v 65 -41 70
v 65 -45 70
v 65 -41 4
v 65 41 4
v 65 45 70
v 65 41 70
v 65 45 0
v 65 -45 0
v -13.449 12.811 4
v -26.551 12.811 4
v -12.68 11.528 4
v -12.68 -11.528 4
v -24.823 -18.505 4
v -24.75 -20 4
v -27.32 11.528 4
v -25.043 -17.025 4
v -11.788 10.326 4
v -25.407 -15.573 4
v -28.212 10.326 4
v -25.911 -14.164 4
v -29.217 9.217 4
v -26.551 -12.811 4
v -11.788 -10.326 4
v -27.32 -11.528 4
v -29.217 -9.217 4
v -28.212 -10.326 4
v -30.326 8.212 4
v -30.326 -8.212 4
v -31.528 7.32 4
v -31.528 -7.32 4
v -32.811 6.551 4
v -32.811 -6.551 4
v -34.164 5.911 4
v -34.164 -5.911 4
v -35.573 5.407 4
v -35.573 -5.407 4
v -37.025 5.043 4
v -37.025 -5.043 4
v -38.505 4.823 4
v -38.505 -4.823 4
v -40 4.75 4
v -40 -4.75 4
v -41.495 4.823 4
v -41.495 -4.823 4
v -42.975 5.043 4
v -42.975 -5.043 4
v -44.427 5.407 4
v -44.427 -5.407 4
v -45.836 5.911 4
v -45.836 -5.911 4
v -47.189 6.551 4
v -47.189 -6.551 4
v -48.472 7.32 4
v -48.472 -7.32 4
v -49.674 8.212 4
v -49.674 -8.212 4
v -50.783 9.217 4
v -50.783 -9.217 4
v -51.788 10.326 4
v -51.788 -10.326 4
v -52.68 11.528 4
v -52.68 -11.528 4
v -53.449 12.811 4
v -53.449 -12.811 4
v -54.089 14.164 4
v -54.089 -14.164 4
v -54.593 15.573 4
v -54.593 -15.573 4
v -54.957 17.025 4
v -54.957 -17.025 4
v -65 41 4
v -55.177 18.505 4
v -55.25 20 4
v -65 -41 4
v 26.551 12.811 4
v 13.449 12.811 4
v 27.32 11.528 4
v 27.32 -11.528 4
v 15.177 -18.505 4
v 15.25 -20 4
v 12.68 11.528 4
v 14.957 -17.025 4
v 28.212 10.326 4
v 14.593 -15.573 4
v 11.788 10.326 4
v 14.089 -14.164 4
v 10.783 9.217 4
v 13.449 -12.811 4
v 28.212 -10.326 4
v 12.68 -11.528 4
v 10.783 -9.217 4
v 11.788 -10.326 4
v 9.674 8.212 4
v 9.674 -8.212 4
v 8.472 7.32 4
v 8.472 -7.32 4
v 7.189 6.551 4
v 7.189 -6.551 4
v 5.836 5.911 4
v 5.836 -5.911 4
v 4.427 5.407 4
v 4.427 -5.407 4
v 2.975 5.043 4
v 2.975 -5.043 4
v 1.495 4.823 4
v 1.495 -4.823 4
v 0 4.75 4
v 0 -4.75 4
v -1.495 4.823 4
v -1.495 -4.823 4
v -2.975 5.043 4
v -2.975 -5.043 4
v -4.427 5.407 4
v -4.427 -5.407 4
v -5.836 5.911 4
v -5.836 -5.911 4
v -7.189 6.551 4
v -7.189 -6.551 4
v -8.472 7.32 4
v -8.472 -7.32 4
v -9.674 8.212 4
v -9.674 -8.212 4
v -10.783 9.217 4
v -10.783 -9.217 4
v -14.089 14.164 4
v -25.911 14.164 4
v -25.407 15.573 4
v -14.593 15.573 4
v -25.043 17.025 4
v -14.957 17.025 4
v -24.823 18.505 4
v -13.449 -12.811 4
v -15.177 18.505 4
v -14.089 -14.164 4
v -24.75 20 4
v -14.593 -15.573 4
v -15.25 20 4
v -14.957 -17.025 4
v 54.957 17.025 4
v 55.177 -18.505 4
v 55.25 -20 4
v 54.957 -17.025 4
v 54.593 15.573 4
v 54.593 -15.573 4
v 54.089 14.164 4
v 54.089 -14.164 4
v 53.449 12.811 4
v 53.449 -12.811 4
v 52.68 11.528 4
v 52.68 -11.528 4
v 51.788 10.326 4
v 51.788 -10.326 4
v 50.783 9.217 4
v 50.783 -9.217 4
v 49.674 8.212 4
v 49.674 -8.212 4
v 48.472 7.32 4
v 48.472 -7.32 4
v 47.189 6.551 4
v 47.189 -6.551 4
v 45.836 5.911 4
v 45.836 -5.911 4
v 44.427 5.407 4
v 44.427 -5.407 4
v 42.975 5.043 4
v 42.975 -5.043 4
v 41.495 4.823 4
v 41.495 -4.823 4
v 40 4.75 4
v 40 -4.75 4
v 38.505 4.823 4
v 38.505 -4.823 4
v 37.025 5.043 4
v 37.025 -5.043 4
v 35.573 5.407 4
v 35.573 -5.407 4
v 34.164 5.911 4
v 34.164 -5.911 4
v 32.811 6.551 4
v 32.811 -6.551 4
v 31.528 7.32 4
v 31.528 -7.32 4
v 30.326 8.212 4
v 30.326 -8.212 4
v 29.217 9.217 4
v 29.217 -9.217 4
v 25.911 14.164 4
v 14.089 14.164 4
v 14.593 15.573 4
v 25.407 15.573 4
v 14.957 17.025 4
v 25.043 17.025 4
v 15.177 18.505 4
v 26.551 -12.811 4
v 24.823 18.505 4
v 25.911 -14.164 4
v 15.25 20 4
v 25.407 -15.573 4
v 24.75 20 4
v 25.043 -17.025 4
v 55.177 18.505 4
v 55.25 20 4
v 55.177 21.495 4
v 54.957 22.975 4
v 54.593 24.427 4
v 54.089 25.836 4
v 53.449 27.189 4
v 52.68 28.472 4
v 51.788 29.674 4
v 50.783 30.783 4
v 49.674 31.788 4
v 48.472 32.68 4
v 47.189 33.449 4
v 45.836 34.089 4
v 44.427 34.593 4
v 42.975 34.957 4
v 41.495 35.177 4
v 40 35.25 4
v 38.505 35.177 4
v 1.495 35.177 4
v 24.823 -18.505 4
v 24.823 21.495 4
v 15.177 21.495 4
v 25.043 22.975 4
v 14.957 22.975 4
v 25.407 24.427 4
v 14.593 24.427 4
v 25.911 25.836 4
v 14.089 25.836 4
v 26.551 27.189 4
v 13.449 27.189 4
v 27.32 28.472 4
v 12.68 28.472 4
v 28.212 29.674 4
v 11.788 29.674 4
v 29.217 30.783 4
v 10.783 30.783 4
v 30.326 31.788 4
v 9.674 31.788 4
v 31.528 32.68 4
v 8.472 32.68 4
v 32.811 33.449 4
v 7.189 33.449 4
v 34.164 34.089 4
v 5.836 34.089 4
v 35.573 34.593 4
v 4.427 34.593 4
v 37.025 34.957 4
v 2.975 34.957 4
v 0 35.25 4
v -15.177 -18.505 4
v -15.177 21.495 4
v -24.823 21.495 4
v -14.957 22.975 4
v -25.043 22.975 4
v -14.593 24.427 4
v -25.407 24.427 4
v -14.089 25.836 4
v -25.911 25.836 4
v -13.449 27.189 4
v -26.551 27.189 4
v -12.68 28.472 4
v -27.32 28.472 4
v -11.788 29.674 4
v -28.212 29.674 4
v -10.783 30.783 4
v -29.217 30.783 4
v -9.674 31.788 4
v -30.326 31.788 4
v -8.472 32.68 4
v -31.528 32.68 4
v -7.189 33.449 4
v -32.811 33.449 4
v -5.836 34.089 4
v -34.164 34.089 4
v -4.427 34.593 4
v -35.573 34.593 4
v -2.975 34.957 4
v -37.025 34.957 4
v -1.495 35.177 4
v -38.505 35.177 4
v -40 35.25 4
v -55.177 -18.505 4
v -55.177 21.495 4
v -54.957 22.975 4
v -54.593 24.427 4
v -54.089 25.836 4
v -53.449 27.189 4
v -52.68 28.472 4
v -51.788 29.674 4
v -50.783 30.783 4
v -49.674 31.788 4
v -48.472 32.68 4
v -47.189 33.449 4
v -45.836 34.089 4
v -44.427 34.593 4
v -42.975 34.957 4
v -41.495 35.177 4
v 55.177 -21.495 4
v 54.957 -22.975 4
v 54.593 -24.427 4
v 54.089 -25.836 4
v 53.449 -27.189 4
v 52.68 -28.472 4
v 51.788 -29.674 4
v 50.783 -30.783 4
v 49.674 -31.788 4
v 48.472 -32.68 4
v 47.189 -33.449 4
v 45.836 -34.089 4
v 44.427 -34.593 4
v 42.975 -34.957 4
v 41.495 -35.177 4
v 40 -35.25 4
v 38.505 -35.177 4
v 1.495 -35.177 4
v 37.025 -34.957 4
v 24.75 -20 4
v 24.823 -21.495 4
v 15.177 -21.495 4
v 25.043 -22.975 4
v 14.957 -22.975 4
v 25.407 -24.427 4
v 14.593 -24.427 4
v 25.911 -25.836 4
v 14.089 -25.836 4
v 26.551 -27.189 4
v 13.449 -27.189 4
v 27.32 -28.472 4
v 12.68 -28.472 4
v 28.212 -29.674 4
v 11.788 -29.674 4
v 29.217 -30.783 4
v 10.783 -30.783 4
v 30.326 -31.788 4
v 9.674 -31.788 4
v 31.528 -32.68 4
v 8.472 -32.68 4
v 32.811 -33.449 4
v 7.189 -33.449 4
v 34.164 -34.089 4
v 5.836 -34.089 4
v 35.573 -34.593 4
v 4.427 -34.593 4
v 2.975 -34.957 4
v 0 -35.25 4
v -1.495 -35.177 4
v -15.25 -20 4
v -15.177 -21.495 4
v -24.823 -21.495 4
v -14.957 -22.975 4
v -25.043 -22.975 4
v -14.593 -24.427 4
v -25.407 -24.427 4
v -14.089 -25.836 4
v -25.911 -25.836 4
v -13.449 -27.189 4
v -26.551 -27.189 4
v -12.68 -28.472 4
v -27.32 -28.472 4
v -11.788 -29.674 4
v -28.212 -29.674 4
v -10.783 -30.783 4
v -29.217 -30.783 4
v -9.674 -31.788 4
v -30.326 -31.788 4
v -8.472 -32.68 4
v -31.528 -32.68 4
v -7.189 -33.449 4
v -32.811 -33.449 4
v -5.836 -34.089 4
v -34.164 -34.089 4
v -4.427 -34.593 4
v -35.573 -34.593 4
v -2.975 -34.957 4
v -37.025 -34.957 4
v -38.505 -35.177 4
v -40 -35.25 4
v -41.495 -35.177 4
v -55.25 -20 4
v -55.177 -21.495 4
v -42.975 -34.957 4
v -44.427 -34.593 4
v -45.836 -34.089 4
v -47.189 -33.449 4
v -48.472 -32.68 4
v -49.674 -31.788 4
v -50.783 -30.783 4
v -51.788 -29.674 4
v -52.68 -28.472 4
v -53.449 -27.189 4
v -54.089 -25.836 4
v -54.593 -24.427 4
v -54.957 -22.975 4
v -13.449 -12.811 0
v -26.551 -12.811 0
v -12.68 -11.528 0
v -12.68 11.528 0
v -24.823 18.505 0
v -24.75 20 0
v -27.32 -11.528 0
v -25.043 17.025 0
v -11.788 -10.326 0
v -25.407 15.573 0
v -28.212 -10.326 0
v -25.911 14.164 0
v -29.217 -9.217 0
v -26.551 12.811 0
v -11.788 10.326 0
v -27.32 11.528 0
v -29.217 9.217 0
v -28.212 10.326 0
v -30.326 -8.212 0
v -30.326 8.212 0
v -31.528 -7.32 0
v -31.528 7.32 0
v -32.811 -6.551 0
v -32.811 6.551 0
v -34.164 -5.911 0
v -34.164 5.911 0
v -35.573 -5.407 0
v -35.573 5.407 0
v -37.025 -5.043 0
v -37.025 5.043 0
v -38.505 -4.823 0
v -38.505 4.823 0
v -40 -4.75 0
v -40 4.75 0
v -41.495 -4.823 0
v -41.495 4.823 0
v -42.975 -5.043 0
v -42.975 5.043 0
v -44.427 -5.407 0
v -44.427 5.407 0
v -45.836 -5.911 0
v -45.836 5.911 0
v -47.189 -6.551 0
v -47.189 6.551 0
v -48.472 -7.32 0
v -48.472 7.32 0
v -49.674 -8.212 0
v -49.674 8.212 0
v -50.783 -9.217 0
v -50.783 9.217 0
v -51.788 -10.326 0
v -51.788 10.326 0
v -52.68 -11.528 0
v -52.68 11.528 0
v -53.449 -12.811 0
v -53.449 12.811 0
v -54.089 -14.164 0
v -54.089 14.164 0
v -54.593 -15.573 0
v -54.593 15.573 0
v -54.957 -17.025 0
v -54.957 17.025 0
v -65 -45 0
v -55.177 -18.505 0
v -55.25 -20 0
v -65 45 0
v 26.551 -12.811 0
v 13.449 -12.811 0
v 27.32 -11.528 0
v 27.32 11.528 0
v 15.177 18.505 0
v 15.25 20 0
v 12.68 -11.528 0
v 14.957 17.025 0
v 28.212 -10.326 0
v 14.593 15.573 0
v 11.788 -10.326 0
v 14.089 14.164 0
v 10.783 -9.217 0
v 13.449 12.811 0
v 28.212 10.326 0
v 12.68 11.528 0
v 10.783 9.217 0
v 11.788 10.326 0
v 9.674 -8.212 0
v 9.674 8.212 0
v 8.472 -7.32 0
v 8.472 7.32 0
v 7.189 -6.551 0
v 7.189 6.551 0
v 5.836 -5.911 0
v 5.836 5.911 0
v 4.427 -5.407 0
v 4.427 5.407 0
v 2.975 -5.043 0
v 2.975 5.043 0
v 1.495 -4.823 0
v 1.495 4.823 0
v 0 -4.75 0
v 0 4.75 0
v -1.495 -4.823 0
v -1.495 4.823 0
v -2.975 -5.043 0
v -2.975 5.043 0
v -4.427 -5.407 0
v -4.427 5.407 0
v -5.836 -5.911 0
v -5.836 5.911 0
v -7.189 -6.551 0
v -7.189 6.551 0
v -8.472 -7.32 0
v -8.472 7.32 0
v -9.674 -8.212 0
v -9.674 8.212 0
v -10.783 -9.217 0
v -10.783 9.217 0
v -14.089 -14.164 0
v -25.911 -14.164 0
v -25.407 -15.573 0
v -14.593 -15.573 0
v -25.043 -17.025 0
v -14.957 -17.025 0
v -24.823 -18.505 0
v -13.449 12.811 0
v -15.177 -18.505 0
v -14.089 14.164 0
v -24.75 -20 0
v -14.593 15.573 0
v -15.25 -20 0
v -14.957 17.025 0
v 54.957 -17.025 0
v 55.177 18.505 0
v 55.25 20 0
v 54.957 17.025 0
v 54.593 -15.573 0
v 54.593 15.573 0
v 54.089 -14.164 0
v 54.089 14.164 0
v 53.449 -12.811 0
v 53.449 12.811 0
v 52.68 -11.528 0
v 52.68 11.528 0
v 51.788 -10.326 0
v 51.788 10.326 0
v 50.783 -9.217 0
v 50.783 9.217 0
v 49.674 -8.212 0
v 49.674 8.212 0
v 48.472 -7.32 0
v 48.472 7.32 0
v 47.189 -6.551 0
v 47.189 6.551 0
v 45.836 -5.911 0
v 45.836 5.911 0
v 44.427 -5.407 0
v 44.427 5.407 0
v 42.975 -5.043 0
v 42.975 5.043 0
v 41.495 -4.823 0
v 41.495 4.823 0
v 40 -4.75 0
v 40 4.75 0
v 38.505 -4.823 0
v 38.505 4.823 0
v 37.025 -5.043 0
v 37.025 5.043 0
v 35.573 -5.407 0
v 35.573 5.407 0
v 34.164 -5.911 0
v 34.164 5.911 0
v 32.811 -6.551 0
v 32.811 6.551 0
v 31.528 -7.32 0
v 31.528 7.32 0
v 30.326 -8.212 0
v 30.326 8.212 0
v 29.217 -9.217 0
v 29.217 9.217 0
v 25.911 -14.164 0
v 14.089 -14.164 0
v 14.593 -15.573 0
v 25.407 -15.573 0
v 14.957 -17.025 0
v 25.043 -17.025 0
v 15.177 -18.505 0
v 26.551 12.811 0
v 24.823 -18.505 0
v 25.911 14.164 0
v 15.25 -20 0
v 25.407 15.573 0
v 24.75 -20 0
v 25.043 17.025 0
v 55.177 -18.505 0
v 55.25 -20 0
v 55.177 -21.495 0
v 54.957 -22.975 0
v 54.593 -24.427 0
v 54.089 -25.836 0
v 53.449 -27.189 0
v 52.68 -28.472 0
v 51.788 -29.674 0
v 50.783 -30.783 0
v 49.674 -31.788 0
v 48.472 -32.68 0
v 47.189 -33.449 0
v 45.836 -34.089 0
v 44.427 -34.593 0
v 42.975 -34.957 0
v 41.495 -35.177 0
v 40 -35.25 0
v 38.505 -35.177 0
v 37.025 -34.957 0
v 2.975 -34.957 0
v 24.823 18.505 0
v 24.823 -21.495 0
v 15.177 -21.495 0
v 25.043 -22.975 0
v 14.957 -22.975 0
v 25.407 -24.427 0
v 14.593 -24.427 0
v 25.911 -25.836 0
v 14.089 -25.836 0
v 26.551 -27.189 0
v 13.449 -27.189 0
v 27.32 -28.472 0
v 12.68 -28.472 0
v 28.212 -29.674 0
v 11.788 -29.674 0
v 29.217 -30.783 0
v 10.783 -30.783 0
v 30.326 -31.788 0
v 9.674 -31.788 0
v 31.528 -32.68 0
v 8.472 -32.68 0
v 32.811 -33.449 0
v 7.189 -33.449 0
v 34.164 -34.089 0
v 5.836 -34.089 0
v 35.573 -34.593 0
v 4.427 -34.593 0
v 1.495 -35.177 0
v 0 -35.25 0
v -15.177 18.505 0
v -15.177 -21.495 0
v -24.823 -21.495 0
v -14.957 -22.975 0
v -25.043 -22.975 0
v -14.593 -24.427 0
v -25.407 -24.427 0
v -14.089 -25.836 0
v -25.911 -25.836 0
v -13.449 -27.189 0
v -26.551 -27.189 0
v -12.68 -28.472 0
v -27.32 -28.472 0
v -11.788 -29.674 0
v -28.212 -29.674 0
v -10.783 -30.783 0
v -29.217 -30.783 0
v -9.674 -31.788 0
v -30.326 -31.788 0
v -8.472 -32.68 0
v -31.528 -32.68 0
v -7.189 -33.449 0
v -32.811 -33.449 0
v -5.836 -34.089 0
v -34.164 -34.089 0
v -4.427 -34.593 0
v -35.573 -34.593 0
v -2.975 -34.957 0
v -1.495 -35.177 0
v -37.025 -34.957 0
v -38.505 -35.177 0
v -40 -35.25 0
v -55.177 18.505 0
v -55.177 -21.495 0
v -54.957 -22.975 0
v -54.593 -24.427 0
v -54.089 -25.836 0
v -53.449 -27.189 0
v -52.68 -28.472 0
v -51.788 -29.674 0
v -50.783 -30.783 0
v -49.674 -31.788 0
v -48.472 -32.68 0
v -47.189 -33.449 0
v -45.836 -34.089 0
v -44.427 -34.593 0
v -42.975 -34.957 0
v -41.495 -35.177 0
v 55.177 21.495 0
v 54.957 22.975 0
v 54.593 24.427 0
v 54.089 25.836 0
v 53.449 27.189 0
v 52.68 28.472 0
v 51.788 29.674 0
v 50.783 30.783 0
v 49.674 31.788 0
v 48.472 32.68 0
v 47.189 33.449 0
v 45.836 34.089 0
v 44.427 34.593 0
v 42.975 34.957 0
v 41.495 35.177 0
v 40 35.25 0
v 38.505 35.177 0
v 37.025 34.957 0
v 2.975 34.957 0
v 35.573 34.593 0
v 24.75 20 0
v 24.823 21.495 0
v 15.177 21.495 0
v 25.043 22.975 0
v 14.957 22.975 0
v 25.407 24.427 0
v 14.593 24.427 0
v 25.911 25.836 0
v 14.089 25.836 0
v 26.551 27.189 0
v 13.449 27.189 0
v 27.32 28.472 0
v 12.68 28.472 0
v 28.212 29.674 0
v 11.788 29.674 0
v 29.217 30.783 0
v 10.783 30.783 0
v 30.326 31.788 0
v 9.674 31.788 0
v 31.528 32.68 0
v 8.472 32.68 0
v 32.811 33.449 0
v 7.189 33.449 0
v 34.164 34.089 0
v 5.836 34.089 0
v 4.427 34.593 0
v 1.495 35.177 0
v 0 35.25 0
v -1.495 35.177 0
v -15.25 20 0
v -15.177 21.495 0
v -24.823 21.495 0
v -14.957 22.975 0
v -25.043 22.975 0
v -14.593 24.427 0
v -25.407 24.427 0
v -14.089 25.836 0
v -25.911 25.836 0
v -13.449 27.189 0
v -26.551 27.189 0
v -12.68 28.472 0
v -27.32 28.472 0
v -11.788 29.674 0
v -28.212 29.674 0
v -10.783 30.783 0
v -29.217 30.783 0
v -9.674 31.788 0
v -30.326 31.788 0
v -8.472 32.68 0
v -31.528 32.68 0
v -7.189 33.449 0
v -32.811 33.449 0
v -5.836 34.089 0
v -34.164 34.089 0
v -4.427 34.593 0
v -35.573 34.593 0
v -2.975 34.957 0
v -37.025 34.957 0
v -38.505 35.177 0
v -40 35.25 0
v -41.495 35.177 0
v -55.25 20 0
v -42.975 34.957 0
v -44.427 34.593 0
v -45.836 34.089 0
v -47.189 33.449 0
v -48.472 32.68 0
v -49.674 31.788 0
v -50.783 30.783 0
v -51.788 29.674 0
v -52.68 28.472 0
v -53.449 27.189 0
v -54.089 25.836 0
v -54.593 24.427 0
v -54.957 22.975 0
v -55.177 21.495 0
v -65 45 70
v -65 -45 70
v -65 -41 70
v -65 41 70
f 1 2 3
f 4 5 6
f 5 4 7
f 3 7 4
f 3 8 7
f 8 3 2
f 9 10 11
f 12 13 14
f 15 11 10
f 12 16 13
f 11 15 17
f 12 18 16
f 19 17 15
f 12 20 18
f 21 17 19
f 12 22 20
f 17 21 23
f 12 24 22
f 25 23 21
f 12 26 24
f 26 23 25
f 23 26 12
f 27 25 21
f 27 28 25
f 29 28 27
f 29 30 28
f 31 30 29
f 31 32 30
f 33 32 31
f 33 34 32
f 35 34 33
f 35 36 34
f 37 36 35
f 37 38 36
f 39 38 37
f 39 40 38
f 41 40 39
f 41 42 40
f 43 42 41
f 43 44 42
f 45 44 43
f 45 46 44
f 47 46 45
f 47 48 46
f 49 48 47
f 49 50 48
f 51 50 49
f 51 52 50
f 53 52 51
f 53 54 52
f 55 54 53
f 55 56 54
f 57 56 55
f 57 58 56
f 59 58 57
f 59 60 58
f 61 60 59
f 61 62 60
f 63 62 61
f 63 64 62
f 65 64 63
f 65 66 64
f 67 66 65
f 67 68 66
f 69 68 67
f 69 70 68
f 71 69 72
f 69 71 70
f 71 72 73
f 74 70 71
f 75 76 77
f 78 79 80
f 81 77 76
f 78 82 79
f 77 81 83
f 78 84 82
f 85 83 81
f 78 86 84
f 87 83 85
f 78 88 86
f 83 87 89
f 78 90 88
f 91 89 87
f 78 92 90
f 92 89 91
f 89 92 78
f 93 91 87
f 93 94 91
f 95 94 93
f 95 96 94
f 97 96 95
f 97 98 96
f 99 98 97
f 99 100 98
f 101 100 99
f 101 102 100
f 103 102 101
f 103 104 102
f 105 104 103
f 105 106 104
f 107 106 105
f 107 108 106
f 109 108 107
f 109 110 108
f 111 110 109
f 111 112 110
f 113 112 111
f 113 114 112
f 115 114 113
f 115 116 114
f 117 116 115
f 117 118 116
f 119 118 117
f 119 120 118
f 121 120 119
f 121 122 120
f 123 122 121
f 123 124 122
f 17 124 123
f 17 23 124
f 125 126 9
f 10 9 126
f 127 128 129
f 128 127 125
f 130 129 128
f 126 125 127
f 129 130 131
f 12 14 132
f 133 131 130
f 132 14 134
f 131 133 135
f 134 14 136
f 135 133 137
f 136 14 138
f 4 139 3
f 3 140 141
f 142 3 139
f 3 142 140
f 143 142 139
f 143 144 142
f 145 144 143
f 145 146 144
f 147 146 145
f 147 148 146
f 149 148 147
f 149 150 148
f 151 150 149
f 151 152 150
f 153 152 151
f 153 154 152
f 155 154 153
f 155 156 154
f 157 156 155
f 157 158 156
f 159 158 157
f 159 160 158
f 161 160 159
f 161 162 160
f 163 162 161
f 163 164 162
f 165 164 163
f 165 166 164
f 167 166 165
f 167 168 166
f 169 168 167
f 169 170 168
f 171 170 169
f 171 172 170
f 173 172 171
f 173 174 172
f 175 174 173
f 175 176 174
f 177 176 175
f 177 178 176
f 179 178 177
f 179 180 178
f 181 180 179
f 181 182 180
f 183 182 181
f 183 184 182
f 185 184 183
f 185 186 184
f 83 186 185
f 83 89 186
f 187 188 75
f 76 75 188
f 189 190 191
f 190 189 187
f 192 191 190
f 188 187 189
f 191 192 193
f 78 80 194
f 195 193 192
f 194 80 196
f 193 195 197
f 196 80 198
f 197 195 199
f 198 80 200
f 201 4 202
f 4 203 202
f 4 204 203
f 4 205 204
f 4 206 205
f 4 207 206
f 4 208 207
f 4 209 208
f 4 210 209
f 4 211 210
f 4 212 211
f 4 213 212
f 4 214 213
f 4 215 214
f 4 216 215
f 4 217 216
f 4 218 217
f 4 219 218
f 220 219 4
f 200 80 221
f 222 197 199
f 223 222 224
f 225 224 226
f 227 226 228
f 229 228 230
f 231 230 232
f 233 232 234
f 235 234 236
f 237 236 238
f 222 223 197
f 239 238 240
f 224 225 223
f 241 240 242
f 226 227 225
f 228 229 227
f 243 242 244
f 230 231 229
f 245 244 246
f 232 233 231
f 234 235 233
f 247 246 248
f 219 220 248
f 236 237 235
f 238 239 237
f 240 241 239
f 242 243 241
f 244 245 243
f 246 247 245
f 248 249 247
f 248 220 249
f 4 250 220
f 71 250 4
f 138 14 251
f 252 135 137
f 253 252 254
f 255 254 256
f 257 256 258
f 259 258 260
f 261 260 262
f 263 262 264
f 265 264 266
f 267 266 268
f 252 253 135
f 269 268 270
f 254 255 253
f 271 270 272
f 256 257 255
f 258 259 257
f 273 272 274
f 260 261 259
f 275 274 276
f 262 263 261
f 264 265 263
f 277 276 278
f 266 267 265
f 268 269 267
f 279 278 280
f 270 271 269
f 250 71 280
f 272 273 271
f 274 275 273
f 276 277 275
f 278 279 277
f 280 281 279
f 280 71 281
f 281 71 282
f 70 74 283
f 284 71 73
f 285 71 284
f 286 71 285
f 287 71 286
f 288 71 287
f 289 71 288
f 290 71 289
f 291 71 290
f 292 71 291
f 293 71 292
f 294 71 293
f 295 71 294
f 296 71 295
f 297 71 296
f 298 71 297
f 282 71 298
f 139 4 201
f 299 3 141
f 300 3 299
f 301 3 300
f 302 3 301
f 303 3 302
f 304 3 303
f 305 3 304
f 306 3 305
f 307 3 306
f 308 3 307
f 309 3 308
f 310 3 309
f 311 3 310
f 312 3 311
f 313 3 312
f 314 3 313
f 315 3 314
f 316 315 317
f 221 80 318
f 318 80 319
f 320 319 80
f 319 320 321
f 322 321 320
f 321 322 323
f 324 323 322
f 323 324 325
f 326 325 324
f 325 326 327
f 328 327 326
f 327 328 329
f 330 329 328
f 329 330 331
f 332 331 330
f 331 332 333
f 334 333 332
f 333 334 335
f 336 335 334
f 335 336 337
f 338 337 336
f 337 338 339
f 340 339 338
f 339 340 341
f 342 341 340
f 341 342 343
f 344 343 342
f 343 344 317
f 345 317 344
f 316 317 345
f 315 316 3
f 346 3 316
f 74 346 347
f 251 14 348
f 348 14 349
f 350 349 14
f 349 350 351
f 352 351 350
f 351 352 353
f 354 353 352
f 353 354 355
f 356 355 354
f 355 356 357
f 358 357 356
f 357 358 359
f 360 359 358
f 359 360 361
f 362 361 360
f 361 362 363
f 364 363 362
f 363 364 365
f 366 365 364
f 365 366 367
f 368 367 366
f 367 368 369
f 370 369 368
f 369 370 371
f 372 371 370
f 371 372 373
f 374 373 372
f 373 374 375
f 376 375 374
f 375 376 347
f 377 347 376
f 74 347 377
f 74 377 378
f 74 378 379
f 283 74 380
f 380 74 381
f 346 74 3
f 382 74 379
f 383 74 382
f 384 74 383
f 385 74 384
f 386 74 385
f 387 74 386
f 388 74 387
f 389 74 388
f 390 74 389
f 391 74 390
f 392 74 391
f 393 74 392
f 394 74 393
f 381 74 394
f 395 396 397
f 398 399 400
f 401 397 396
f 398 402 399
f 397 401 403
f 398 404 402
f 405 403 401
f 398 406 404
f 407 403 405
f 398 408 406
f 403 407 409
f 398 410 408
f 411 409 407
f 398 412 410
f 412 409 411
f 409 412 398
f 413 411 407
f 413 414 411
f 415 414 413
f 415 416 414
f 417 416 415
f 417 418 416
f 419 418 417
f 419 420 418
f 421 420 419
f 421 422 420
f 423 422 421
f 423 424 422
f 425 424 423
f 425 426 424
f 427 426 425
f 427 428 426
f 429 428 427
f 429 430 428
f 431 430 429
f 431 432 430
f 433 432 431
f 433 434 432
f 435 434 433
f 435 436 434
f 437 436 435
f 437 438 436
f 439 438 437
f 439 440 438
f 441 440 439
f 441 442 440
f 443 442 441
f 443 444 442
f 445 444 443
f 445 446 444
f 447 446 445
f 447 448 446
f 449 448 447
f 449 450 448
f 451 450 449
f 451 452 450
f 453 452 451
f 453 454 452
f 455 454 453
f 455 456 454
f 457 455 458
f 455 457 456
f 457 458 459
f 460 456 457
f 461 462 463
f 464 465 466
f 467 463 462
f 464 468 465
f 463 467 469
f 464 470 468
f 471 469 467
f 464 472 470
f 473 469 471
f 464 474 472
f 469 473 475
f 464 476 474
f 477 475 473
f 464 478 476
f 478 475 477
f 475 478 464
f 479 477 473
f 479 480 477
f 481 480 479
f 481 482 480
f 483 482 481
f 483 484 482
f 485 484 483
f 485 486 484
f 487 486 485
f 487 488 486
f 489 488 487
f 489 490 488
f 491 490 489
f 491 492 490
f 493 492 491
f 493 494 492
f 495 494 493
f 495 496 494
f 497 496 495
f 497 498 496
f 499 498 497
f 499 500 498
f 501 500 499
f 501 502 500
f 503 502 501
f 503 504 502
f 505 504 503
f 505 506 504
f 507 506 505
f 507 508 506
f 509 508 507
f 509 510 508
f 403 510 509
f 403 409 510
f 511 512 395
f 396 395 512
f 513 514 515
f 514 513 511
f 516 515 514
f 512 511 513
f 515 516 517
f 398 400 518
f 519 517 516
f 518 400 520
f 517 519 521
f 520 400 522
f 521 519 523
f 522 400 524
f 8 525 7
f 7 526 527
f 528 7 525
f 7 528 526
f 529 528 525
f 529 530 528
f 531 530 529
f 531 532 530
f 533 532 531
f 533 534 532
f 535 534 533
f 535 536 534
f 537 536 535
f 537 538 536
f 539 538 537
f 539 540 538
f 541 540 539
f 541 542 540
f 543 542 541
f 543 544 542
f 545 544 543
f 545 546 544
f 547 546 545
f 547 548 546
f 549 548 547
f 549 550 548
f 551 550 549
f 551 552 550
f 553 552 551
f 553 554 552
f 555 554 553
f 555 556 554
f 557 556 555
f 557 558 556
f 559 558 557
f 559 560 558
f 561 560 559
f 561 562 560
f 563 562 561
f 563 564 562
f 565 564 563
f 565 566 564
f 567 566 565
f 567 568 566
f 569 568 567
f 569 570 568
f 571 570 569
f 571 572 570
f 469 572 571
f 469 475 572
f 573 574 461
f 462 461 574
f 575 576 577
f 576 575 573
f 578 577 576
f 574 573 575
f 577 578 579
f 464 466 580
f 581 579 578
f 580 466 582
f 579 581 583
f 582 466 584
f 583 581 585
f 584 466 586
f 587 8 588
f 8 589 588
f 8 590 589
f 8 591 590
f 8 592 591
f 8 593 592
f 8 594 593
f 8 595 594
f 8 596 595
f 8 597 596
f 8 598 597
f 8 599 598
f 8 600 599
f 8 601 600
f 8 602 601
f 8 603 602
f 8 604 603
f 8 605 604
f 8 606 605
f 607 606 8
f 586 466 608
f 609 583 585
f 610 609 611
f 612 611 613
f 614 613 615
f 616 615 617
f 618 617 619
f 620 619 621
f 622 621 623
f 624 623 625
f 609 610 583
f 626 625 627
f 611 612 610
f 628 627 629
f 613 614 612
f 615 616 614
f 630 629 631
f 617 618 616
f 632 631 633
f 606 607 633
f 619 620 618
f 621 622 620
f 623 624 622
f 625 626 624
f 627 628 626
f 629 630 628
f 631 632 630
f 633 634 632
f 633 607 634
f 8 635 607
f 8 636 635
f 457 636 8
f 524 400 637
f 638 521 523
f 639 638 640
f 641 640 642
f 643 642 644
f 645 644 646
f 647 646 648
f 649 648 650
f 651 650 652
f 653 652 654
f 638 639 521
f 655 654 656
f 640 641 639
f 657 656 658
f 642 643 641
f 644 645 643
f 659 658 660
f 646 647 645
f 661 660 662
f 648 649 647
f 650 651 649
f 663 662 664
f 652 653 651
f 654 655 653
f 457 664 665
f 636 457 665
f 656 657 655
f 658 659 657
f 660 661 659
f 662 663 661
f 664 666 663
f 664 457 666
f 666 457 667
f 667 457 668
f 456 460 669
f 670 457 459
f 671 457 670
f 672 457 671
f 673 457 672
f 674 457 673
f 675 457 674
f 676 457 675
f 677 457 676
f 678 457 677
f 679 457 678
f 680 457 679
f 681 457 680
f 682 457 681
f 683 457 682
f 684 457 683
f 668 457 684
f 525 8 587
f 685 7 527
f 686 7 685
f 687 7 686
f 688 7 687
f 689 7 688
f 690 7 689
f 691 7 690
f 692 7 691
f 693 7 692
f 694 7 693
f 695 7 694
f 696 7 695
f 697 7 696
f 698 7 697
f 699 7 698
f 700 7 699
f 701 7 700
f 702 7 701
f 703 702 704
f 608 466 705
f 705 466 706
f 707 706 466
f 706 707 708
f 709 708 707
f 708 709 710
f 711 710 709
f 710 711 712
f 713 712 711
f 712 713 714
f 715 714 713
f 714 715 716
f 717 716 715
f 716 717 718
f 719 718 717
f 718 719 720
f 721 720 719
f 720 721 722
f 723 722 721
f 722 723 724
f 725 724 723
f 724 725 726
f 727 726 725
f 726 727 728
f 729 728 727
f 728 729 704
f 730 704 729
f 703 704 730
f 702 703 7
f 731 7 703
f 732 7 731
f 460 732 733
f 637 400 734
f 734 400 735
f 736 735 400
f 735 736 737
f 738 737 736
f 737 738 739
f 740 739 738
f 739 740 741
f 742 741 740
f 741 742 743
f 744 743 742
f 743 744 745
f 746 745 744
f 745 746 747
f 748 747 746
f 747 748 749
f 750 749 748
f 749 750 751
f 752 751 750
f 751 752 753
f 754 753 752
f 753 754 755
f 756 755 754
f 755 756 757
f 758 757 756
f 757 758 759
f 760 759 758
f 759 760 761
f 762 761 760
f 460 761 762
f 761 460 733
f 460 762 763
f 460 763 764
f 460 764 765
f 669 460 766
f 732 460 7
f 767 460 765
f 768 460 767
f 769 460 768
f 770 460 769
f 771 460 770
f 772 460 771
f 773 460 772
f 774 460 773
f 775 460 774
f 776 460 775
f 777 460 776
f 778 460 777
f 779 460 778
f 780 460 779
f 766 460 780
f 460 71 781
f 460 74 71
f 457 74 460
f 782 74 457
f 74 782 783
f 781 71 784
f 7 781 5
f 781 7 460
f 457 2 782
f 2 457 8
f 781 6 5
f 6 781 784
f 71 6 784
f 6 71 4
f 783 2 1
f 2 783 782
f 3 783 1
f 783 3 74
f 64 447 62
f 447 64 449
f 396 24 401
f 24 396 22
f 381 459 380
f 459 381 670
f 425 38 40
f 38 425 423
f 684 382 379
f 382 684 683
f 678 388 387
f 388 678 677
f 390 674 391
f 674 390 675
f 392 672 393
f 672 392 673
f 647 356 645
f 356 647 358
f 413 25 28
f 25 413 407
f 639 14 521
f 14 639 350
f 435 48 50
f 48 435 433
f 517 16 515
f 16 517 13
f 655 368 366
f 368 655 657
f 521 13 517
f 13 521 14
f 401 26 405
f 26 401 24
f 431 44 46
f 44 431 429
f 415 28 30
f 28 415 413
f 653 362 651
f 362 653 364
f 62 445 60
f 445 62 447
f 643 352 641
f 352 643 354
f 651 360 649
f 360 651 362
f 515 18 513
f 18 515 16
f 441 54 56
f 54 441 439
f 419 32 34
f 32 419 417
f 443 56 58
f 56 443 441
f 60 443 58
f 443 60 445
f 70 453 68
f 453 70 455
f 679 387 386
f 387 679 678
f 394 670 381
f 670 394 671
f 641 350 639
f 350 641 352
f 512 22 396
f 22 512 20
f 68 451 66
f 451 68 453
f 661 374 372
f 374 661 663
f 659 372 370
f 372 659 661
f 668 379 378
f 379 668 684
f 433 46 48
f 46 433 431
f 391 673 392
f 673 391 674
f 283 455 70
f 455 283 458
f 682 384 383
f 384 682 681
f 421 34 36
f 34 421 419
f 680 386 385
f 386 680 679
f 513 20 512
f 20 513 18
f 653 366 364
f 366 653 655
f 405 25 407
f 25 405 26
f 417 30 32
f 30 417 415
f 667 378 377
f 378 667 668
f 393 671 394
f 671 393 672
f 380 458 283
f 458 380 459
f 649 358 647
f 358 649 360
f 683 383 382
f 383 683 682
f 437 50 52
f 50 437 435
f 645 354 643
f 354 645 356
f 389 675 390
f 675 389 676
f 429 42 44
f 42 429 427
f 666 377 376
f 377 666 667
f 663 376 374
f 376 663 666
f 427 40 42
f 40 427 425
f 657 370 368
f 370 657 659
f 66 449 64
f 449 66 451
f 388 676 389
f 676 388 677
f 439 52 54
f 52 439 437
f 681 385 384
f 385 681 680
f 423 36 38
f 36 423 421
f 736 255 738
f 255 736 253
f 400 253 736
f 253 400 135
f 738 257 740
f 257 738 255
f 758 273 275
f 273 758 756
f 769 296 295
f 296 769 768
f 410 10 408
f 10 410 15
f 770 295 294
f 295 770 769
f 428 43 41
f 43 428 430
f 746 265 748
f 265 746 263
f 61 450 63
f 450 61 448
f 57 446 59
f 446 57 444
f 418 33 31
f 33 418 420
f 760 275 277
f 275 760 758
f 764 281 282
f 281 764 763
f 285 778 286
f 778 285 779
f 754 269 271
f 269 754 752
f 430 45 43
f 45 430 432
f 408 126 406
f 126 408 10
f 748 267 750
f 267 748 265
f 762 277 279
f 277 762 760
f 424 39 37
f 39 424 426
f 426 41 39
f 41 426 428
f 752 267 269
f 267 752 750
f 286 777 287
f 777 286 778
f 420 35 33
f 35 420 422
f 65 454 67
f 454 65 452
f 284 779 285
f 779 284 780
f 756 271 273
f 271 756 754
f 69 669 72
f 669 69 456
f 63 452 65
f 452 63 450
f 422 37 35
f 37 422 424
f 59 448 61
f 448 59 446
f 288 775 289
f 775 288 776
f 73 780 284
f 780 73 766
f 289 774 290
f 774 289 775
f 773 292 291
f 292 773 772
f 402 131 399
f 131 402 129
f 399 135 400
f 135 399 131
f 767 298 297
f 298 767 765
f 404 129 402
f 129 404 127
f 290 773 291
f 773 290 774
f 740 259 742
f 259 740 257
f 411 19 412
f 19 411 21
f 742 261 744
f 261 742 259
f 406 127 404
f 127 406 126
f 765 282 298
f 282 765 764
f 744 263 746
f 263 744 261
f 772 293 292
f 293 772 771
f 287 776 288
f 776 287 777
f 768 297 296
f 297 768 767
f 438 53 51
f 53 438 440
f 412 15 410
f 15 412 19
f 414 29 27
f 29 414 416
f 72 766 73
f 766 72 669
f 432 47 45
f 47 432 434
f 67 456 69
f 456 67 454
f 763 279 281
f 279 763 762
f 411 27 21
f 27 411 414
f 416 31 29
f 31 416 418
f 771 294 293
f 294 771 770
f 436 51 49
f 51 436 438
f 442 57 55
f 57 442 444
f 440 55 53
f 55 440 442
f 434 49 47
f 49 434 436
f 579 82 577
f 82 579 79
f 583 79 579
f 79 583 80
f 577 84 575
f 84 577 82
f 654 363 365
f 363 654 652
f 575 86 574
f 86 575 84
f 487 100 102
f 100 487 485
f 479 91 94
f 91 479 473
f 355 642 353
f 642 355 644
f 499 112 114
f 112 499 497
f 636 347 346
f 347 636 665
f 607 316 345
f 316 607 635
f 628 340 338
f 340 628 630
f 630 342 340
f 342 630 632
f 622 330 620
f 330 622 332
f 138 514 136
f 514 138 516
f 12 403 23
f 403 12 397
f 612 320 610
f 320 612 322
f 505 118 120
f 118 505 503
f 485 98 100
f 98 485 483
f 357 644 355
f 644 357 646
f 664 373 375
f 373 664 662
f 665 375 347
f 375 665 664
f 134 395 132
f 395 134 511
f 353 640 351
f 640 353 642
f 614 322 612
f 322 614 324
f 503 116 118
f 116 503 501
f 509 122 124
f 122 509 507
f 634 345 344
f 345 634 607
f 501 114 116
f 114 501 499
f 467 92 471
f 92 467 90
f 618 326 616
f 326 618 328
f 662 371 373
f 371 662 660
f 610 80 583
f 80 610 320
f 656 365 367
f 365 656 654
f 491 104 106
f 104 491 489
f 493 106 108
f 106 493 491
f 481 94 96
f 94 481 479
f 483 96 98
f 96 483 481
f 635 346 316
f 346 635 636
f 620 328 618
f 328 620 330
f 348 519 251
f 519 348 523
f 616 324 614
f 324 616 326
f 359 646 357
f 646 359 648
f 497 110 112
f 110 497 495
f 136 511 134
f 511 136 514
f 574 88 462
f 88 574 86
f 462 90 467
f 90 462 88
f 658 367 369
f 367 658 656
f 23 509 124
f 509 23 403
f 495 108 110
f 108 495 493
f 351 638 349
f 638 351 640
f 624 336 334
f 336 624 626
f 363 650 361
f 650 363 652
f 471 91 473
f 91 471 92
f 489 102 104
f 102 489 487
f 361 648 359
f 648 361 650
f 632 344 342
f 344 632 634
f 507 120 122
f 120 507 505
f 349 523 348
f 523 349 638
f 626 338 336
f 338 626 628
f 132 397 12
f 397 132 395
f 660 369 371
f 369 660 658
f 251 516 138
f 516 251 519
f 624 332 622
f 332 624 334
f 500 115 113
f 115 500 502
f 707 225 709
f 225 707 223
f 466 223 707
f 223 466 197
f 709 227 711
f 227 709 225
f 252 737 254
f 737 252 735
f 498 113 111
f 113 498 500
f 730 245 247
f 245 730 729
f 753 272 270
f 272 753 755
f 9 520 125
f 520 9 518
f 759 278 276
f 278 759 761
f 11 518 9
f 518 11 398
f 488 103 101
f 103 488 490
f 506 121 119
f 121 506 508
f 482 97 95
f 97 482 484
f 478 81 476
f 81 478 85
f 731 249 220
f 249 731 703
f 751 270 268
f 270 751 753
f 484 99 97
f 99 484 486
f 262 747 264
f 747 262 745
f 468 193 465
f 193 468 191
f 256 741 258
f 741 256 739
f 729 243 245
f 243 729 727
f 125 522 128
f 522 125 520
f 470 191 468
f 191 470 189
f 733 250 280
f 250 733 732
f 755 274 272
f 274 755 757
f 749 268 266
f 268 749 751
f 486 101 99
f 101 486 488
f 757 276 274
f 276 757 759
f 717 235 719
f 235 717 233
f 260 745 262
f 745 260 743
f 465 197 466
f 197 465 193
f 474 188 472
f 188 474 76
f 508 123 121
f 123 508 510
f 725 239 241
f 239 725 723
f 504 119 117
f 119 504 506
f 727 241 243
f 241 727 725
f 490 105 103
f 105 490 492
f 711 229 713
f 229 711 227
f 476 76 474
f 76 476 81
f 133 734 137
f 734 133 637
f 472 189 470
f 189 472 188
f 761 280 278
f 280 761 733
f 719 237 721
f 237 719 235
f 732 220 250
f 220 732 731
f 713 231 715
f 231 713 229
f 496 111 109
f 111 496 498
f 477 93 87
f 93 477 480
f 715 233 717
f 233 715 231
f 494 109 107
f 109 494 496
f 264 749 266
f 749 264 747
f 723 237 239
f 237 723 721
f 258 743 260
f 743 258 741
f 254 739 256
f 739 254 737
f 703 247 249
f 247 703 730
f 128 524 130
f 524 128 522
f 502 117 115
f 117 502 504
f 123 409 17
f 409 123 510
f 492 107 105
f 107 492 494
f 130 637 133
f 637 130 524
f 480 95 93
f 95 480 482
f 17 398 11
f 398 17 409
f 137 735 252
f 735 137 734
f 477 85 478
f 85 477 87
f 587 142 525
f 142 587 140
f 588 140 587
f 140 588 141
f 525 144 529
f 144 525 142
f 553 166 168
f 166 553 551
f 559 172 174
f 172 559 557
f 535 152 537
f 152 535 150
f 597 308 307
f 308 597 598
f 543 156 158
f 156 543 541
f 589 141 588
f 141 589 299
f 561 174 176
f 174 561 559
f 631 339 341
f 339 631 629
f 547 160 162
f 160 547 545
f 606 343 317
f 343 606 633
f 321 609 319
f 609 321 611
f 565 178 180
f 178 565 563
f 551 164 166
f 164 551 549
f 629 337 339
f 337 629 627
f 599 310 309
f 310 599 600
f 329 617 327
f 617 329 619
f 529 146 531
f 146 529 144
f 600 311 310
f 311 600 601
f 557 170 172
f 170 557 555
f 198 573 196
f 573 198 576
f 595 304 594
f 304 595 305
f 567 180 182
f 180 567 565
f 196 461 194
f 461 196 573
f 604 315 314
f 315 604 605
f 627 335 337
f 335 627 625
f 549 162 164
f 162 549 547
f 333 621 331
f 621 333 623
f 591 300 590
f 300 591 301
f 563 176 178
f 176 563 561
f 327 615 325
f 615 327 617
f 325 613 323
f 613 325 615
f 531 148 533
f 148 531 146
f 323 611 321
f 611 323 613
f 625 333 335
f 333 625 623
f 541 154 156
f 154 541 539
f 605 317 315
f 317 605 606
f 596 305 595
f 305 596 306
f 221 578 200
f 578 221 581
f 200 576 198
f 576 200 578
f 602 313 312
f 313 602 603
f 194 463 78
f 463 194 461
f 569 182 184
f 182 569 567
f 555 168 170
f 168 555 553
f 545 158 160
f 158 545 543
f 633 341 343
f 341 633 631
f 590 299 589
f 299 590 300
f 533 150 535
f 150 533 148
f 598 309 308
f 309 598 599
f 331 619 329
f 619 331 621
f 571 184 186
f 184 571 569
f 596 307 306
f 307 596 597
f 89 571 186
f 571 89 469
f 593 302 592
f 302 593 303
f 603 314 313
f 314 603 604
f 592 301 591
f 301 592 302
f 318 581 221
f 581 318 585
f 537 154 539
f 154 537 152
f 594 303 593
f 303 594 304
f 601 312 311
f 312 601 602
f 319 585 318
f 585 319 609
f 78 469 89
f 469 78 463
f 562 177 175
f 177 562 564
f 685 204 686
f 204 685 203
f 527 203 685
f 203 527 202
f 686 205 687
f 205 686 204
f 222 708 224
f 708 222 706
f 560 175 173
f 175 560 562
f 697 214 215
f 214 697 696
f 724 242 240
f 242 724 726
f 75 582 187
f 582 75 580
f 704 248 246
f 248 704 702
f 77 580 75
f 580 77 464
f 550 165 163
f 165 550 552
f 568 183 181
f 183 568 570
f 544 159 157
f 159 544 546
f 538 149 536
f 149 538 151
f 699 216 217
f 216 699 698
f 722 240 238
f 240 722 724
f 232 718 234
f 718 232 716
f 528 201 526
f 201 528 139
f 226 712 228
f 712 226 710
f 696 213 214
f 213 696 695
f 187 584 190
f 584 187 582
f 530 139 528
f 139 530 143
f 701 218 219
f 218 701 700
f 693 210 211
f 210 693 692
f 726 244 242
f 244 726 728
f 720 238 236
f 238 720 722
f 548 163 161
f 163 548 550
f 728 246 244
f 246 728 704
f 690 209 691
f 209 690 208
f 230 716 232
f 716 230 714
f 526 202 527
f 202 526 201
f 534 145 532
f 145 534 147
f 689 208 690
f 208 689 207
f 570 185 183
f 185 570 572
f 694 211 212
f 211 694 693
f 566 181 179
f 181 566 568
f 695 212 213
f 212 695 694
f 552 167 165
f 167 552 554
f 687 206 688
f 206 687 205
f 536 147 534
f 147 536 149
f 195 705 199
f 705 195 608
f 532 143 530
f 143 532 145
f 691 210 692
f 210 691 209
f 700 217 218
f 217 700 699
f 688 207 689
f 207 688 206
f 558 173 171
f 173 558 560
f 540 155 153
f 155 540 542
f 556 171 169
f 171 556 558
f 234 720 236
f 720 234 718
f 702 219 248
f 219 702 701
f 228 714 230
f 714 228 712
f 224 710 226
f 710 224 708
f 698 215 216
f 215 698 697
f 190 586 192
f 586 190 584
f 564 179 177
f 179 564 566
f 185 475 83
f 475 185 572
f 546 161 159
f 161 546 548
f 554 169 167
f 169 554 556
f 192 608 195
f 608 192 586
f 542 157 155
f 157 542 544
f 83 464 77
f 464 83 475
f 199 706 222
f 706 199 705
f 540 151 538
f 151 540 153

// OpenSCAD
// 50 mL conical (Falcon) tube rack – printed upside-down, then flipped over.
// Print orientation: flat plate on the bed (z = 0..4), walls rising in +Z.
// After flipping, the rack stands on the two walls and tubes pass through the holes.

// ---- Dimensions (mm) ----
plate_X   = 130;   // plate length along X
plate_Y   = 90;    // plate width along Y
plate_T   = 4;     // plate thickness (z = 0 to 4)

wall_T    = 4;     // wall thickness (Y)
wall_H    = 70;    // wall height above the bed (z = 0 to 70)

hole_D    = 30.5;  // through-hole diameter
hole_R    = hole_D / 2;

pitch_X   = 40;    // hole centre spacing along X
pitch_Y   = 40;    // hole centre spacing along Y

$fn = 64;          // roundness for holes

// Hole centre coordinates: 2 rows (Y) x 3 columns (X), centred on the plate.
hole_X = [-pitch_X, 0, pitch_X];
hole_Y = [-pitch_Y / 2, pitch_Y / 2];

// ---- Base plate (z = 0 to plate_T), centred in X and Y ----
module plate() {
    translate([-plate_X / 2, -plate_Y / 2, 0])
        cube([plate_X, plate_Y, plate_T]);
}

// ---- Two long-edge walls (z = 0 to wall_H), flush with the plate's long edges ----
// Wall 1: along +Y edge (y = +plate_Y/2)
module wall_1() {
    translate([-plate_X / 2,  plate_Y / 2 - wall_T, 0])
        cube([plate_X, wall_T, wall_H]);
}

// Wall 2: along -Y edge (y = -plate_Y/2)
module wall_2() {
    translate([-plate_X / 2, -plate_Y / 2, 0])
        cube([plate_X, wall_T, wall_H]);
}

// ---- Six through-holes (extend 1 mm past each face to avoid coplanar cuts) ----
module holes() {
    for (hx = hole_X, hy = hole_Y)
        translate([hx, hy, -1])
            cylinder(h = plate_T + 2, r = hole_R, $fn = $fn);
}

// ---- Final solid ----
difference() {
    union() {
        plate();
        wall_1();
        wall_2();
    }
    holes();
}
